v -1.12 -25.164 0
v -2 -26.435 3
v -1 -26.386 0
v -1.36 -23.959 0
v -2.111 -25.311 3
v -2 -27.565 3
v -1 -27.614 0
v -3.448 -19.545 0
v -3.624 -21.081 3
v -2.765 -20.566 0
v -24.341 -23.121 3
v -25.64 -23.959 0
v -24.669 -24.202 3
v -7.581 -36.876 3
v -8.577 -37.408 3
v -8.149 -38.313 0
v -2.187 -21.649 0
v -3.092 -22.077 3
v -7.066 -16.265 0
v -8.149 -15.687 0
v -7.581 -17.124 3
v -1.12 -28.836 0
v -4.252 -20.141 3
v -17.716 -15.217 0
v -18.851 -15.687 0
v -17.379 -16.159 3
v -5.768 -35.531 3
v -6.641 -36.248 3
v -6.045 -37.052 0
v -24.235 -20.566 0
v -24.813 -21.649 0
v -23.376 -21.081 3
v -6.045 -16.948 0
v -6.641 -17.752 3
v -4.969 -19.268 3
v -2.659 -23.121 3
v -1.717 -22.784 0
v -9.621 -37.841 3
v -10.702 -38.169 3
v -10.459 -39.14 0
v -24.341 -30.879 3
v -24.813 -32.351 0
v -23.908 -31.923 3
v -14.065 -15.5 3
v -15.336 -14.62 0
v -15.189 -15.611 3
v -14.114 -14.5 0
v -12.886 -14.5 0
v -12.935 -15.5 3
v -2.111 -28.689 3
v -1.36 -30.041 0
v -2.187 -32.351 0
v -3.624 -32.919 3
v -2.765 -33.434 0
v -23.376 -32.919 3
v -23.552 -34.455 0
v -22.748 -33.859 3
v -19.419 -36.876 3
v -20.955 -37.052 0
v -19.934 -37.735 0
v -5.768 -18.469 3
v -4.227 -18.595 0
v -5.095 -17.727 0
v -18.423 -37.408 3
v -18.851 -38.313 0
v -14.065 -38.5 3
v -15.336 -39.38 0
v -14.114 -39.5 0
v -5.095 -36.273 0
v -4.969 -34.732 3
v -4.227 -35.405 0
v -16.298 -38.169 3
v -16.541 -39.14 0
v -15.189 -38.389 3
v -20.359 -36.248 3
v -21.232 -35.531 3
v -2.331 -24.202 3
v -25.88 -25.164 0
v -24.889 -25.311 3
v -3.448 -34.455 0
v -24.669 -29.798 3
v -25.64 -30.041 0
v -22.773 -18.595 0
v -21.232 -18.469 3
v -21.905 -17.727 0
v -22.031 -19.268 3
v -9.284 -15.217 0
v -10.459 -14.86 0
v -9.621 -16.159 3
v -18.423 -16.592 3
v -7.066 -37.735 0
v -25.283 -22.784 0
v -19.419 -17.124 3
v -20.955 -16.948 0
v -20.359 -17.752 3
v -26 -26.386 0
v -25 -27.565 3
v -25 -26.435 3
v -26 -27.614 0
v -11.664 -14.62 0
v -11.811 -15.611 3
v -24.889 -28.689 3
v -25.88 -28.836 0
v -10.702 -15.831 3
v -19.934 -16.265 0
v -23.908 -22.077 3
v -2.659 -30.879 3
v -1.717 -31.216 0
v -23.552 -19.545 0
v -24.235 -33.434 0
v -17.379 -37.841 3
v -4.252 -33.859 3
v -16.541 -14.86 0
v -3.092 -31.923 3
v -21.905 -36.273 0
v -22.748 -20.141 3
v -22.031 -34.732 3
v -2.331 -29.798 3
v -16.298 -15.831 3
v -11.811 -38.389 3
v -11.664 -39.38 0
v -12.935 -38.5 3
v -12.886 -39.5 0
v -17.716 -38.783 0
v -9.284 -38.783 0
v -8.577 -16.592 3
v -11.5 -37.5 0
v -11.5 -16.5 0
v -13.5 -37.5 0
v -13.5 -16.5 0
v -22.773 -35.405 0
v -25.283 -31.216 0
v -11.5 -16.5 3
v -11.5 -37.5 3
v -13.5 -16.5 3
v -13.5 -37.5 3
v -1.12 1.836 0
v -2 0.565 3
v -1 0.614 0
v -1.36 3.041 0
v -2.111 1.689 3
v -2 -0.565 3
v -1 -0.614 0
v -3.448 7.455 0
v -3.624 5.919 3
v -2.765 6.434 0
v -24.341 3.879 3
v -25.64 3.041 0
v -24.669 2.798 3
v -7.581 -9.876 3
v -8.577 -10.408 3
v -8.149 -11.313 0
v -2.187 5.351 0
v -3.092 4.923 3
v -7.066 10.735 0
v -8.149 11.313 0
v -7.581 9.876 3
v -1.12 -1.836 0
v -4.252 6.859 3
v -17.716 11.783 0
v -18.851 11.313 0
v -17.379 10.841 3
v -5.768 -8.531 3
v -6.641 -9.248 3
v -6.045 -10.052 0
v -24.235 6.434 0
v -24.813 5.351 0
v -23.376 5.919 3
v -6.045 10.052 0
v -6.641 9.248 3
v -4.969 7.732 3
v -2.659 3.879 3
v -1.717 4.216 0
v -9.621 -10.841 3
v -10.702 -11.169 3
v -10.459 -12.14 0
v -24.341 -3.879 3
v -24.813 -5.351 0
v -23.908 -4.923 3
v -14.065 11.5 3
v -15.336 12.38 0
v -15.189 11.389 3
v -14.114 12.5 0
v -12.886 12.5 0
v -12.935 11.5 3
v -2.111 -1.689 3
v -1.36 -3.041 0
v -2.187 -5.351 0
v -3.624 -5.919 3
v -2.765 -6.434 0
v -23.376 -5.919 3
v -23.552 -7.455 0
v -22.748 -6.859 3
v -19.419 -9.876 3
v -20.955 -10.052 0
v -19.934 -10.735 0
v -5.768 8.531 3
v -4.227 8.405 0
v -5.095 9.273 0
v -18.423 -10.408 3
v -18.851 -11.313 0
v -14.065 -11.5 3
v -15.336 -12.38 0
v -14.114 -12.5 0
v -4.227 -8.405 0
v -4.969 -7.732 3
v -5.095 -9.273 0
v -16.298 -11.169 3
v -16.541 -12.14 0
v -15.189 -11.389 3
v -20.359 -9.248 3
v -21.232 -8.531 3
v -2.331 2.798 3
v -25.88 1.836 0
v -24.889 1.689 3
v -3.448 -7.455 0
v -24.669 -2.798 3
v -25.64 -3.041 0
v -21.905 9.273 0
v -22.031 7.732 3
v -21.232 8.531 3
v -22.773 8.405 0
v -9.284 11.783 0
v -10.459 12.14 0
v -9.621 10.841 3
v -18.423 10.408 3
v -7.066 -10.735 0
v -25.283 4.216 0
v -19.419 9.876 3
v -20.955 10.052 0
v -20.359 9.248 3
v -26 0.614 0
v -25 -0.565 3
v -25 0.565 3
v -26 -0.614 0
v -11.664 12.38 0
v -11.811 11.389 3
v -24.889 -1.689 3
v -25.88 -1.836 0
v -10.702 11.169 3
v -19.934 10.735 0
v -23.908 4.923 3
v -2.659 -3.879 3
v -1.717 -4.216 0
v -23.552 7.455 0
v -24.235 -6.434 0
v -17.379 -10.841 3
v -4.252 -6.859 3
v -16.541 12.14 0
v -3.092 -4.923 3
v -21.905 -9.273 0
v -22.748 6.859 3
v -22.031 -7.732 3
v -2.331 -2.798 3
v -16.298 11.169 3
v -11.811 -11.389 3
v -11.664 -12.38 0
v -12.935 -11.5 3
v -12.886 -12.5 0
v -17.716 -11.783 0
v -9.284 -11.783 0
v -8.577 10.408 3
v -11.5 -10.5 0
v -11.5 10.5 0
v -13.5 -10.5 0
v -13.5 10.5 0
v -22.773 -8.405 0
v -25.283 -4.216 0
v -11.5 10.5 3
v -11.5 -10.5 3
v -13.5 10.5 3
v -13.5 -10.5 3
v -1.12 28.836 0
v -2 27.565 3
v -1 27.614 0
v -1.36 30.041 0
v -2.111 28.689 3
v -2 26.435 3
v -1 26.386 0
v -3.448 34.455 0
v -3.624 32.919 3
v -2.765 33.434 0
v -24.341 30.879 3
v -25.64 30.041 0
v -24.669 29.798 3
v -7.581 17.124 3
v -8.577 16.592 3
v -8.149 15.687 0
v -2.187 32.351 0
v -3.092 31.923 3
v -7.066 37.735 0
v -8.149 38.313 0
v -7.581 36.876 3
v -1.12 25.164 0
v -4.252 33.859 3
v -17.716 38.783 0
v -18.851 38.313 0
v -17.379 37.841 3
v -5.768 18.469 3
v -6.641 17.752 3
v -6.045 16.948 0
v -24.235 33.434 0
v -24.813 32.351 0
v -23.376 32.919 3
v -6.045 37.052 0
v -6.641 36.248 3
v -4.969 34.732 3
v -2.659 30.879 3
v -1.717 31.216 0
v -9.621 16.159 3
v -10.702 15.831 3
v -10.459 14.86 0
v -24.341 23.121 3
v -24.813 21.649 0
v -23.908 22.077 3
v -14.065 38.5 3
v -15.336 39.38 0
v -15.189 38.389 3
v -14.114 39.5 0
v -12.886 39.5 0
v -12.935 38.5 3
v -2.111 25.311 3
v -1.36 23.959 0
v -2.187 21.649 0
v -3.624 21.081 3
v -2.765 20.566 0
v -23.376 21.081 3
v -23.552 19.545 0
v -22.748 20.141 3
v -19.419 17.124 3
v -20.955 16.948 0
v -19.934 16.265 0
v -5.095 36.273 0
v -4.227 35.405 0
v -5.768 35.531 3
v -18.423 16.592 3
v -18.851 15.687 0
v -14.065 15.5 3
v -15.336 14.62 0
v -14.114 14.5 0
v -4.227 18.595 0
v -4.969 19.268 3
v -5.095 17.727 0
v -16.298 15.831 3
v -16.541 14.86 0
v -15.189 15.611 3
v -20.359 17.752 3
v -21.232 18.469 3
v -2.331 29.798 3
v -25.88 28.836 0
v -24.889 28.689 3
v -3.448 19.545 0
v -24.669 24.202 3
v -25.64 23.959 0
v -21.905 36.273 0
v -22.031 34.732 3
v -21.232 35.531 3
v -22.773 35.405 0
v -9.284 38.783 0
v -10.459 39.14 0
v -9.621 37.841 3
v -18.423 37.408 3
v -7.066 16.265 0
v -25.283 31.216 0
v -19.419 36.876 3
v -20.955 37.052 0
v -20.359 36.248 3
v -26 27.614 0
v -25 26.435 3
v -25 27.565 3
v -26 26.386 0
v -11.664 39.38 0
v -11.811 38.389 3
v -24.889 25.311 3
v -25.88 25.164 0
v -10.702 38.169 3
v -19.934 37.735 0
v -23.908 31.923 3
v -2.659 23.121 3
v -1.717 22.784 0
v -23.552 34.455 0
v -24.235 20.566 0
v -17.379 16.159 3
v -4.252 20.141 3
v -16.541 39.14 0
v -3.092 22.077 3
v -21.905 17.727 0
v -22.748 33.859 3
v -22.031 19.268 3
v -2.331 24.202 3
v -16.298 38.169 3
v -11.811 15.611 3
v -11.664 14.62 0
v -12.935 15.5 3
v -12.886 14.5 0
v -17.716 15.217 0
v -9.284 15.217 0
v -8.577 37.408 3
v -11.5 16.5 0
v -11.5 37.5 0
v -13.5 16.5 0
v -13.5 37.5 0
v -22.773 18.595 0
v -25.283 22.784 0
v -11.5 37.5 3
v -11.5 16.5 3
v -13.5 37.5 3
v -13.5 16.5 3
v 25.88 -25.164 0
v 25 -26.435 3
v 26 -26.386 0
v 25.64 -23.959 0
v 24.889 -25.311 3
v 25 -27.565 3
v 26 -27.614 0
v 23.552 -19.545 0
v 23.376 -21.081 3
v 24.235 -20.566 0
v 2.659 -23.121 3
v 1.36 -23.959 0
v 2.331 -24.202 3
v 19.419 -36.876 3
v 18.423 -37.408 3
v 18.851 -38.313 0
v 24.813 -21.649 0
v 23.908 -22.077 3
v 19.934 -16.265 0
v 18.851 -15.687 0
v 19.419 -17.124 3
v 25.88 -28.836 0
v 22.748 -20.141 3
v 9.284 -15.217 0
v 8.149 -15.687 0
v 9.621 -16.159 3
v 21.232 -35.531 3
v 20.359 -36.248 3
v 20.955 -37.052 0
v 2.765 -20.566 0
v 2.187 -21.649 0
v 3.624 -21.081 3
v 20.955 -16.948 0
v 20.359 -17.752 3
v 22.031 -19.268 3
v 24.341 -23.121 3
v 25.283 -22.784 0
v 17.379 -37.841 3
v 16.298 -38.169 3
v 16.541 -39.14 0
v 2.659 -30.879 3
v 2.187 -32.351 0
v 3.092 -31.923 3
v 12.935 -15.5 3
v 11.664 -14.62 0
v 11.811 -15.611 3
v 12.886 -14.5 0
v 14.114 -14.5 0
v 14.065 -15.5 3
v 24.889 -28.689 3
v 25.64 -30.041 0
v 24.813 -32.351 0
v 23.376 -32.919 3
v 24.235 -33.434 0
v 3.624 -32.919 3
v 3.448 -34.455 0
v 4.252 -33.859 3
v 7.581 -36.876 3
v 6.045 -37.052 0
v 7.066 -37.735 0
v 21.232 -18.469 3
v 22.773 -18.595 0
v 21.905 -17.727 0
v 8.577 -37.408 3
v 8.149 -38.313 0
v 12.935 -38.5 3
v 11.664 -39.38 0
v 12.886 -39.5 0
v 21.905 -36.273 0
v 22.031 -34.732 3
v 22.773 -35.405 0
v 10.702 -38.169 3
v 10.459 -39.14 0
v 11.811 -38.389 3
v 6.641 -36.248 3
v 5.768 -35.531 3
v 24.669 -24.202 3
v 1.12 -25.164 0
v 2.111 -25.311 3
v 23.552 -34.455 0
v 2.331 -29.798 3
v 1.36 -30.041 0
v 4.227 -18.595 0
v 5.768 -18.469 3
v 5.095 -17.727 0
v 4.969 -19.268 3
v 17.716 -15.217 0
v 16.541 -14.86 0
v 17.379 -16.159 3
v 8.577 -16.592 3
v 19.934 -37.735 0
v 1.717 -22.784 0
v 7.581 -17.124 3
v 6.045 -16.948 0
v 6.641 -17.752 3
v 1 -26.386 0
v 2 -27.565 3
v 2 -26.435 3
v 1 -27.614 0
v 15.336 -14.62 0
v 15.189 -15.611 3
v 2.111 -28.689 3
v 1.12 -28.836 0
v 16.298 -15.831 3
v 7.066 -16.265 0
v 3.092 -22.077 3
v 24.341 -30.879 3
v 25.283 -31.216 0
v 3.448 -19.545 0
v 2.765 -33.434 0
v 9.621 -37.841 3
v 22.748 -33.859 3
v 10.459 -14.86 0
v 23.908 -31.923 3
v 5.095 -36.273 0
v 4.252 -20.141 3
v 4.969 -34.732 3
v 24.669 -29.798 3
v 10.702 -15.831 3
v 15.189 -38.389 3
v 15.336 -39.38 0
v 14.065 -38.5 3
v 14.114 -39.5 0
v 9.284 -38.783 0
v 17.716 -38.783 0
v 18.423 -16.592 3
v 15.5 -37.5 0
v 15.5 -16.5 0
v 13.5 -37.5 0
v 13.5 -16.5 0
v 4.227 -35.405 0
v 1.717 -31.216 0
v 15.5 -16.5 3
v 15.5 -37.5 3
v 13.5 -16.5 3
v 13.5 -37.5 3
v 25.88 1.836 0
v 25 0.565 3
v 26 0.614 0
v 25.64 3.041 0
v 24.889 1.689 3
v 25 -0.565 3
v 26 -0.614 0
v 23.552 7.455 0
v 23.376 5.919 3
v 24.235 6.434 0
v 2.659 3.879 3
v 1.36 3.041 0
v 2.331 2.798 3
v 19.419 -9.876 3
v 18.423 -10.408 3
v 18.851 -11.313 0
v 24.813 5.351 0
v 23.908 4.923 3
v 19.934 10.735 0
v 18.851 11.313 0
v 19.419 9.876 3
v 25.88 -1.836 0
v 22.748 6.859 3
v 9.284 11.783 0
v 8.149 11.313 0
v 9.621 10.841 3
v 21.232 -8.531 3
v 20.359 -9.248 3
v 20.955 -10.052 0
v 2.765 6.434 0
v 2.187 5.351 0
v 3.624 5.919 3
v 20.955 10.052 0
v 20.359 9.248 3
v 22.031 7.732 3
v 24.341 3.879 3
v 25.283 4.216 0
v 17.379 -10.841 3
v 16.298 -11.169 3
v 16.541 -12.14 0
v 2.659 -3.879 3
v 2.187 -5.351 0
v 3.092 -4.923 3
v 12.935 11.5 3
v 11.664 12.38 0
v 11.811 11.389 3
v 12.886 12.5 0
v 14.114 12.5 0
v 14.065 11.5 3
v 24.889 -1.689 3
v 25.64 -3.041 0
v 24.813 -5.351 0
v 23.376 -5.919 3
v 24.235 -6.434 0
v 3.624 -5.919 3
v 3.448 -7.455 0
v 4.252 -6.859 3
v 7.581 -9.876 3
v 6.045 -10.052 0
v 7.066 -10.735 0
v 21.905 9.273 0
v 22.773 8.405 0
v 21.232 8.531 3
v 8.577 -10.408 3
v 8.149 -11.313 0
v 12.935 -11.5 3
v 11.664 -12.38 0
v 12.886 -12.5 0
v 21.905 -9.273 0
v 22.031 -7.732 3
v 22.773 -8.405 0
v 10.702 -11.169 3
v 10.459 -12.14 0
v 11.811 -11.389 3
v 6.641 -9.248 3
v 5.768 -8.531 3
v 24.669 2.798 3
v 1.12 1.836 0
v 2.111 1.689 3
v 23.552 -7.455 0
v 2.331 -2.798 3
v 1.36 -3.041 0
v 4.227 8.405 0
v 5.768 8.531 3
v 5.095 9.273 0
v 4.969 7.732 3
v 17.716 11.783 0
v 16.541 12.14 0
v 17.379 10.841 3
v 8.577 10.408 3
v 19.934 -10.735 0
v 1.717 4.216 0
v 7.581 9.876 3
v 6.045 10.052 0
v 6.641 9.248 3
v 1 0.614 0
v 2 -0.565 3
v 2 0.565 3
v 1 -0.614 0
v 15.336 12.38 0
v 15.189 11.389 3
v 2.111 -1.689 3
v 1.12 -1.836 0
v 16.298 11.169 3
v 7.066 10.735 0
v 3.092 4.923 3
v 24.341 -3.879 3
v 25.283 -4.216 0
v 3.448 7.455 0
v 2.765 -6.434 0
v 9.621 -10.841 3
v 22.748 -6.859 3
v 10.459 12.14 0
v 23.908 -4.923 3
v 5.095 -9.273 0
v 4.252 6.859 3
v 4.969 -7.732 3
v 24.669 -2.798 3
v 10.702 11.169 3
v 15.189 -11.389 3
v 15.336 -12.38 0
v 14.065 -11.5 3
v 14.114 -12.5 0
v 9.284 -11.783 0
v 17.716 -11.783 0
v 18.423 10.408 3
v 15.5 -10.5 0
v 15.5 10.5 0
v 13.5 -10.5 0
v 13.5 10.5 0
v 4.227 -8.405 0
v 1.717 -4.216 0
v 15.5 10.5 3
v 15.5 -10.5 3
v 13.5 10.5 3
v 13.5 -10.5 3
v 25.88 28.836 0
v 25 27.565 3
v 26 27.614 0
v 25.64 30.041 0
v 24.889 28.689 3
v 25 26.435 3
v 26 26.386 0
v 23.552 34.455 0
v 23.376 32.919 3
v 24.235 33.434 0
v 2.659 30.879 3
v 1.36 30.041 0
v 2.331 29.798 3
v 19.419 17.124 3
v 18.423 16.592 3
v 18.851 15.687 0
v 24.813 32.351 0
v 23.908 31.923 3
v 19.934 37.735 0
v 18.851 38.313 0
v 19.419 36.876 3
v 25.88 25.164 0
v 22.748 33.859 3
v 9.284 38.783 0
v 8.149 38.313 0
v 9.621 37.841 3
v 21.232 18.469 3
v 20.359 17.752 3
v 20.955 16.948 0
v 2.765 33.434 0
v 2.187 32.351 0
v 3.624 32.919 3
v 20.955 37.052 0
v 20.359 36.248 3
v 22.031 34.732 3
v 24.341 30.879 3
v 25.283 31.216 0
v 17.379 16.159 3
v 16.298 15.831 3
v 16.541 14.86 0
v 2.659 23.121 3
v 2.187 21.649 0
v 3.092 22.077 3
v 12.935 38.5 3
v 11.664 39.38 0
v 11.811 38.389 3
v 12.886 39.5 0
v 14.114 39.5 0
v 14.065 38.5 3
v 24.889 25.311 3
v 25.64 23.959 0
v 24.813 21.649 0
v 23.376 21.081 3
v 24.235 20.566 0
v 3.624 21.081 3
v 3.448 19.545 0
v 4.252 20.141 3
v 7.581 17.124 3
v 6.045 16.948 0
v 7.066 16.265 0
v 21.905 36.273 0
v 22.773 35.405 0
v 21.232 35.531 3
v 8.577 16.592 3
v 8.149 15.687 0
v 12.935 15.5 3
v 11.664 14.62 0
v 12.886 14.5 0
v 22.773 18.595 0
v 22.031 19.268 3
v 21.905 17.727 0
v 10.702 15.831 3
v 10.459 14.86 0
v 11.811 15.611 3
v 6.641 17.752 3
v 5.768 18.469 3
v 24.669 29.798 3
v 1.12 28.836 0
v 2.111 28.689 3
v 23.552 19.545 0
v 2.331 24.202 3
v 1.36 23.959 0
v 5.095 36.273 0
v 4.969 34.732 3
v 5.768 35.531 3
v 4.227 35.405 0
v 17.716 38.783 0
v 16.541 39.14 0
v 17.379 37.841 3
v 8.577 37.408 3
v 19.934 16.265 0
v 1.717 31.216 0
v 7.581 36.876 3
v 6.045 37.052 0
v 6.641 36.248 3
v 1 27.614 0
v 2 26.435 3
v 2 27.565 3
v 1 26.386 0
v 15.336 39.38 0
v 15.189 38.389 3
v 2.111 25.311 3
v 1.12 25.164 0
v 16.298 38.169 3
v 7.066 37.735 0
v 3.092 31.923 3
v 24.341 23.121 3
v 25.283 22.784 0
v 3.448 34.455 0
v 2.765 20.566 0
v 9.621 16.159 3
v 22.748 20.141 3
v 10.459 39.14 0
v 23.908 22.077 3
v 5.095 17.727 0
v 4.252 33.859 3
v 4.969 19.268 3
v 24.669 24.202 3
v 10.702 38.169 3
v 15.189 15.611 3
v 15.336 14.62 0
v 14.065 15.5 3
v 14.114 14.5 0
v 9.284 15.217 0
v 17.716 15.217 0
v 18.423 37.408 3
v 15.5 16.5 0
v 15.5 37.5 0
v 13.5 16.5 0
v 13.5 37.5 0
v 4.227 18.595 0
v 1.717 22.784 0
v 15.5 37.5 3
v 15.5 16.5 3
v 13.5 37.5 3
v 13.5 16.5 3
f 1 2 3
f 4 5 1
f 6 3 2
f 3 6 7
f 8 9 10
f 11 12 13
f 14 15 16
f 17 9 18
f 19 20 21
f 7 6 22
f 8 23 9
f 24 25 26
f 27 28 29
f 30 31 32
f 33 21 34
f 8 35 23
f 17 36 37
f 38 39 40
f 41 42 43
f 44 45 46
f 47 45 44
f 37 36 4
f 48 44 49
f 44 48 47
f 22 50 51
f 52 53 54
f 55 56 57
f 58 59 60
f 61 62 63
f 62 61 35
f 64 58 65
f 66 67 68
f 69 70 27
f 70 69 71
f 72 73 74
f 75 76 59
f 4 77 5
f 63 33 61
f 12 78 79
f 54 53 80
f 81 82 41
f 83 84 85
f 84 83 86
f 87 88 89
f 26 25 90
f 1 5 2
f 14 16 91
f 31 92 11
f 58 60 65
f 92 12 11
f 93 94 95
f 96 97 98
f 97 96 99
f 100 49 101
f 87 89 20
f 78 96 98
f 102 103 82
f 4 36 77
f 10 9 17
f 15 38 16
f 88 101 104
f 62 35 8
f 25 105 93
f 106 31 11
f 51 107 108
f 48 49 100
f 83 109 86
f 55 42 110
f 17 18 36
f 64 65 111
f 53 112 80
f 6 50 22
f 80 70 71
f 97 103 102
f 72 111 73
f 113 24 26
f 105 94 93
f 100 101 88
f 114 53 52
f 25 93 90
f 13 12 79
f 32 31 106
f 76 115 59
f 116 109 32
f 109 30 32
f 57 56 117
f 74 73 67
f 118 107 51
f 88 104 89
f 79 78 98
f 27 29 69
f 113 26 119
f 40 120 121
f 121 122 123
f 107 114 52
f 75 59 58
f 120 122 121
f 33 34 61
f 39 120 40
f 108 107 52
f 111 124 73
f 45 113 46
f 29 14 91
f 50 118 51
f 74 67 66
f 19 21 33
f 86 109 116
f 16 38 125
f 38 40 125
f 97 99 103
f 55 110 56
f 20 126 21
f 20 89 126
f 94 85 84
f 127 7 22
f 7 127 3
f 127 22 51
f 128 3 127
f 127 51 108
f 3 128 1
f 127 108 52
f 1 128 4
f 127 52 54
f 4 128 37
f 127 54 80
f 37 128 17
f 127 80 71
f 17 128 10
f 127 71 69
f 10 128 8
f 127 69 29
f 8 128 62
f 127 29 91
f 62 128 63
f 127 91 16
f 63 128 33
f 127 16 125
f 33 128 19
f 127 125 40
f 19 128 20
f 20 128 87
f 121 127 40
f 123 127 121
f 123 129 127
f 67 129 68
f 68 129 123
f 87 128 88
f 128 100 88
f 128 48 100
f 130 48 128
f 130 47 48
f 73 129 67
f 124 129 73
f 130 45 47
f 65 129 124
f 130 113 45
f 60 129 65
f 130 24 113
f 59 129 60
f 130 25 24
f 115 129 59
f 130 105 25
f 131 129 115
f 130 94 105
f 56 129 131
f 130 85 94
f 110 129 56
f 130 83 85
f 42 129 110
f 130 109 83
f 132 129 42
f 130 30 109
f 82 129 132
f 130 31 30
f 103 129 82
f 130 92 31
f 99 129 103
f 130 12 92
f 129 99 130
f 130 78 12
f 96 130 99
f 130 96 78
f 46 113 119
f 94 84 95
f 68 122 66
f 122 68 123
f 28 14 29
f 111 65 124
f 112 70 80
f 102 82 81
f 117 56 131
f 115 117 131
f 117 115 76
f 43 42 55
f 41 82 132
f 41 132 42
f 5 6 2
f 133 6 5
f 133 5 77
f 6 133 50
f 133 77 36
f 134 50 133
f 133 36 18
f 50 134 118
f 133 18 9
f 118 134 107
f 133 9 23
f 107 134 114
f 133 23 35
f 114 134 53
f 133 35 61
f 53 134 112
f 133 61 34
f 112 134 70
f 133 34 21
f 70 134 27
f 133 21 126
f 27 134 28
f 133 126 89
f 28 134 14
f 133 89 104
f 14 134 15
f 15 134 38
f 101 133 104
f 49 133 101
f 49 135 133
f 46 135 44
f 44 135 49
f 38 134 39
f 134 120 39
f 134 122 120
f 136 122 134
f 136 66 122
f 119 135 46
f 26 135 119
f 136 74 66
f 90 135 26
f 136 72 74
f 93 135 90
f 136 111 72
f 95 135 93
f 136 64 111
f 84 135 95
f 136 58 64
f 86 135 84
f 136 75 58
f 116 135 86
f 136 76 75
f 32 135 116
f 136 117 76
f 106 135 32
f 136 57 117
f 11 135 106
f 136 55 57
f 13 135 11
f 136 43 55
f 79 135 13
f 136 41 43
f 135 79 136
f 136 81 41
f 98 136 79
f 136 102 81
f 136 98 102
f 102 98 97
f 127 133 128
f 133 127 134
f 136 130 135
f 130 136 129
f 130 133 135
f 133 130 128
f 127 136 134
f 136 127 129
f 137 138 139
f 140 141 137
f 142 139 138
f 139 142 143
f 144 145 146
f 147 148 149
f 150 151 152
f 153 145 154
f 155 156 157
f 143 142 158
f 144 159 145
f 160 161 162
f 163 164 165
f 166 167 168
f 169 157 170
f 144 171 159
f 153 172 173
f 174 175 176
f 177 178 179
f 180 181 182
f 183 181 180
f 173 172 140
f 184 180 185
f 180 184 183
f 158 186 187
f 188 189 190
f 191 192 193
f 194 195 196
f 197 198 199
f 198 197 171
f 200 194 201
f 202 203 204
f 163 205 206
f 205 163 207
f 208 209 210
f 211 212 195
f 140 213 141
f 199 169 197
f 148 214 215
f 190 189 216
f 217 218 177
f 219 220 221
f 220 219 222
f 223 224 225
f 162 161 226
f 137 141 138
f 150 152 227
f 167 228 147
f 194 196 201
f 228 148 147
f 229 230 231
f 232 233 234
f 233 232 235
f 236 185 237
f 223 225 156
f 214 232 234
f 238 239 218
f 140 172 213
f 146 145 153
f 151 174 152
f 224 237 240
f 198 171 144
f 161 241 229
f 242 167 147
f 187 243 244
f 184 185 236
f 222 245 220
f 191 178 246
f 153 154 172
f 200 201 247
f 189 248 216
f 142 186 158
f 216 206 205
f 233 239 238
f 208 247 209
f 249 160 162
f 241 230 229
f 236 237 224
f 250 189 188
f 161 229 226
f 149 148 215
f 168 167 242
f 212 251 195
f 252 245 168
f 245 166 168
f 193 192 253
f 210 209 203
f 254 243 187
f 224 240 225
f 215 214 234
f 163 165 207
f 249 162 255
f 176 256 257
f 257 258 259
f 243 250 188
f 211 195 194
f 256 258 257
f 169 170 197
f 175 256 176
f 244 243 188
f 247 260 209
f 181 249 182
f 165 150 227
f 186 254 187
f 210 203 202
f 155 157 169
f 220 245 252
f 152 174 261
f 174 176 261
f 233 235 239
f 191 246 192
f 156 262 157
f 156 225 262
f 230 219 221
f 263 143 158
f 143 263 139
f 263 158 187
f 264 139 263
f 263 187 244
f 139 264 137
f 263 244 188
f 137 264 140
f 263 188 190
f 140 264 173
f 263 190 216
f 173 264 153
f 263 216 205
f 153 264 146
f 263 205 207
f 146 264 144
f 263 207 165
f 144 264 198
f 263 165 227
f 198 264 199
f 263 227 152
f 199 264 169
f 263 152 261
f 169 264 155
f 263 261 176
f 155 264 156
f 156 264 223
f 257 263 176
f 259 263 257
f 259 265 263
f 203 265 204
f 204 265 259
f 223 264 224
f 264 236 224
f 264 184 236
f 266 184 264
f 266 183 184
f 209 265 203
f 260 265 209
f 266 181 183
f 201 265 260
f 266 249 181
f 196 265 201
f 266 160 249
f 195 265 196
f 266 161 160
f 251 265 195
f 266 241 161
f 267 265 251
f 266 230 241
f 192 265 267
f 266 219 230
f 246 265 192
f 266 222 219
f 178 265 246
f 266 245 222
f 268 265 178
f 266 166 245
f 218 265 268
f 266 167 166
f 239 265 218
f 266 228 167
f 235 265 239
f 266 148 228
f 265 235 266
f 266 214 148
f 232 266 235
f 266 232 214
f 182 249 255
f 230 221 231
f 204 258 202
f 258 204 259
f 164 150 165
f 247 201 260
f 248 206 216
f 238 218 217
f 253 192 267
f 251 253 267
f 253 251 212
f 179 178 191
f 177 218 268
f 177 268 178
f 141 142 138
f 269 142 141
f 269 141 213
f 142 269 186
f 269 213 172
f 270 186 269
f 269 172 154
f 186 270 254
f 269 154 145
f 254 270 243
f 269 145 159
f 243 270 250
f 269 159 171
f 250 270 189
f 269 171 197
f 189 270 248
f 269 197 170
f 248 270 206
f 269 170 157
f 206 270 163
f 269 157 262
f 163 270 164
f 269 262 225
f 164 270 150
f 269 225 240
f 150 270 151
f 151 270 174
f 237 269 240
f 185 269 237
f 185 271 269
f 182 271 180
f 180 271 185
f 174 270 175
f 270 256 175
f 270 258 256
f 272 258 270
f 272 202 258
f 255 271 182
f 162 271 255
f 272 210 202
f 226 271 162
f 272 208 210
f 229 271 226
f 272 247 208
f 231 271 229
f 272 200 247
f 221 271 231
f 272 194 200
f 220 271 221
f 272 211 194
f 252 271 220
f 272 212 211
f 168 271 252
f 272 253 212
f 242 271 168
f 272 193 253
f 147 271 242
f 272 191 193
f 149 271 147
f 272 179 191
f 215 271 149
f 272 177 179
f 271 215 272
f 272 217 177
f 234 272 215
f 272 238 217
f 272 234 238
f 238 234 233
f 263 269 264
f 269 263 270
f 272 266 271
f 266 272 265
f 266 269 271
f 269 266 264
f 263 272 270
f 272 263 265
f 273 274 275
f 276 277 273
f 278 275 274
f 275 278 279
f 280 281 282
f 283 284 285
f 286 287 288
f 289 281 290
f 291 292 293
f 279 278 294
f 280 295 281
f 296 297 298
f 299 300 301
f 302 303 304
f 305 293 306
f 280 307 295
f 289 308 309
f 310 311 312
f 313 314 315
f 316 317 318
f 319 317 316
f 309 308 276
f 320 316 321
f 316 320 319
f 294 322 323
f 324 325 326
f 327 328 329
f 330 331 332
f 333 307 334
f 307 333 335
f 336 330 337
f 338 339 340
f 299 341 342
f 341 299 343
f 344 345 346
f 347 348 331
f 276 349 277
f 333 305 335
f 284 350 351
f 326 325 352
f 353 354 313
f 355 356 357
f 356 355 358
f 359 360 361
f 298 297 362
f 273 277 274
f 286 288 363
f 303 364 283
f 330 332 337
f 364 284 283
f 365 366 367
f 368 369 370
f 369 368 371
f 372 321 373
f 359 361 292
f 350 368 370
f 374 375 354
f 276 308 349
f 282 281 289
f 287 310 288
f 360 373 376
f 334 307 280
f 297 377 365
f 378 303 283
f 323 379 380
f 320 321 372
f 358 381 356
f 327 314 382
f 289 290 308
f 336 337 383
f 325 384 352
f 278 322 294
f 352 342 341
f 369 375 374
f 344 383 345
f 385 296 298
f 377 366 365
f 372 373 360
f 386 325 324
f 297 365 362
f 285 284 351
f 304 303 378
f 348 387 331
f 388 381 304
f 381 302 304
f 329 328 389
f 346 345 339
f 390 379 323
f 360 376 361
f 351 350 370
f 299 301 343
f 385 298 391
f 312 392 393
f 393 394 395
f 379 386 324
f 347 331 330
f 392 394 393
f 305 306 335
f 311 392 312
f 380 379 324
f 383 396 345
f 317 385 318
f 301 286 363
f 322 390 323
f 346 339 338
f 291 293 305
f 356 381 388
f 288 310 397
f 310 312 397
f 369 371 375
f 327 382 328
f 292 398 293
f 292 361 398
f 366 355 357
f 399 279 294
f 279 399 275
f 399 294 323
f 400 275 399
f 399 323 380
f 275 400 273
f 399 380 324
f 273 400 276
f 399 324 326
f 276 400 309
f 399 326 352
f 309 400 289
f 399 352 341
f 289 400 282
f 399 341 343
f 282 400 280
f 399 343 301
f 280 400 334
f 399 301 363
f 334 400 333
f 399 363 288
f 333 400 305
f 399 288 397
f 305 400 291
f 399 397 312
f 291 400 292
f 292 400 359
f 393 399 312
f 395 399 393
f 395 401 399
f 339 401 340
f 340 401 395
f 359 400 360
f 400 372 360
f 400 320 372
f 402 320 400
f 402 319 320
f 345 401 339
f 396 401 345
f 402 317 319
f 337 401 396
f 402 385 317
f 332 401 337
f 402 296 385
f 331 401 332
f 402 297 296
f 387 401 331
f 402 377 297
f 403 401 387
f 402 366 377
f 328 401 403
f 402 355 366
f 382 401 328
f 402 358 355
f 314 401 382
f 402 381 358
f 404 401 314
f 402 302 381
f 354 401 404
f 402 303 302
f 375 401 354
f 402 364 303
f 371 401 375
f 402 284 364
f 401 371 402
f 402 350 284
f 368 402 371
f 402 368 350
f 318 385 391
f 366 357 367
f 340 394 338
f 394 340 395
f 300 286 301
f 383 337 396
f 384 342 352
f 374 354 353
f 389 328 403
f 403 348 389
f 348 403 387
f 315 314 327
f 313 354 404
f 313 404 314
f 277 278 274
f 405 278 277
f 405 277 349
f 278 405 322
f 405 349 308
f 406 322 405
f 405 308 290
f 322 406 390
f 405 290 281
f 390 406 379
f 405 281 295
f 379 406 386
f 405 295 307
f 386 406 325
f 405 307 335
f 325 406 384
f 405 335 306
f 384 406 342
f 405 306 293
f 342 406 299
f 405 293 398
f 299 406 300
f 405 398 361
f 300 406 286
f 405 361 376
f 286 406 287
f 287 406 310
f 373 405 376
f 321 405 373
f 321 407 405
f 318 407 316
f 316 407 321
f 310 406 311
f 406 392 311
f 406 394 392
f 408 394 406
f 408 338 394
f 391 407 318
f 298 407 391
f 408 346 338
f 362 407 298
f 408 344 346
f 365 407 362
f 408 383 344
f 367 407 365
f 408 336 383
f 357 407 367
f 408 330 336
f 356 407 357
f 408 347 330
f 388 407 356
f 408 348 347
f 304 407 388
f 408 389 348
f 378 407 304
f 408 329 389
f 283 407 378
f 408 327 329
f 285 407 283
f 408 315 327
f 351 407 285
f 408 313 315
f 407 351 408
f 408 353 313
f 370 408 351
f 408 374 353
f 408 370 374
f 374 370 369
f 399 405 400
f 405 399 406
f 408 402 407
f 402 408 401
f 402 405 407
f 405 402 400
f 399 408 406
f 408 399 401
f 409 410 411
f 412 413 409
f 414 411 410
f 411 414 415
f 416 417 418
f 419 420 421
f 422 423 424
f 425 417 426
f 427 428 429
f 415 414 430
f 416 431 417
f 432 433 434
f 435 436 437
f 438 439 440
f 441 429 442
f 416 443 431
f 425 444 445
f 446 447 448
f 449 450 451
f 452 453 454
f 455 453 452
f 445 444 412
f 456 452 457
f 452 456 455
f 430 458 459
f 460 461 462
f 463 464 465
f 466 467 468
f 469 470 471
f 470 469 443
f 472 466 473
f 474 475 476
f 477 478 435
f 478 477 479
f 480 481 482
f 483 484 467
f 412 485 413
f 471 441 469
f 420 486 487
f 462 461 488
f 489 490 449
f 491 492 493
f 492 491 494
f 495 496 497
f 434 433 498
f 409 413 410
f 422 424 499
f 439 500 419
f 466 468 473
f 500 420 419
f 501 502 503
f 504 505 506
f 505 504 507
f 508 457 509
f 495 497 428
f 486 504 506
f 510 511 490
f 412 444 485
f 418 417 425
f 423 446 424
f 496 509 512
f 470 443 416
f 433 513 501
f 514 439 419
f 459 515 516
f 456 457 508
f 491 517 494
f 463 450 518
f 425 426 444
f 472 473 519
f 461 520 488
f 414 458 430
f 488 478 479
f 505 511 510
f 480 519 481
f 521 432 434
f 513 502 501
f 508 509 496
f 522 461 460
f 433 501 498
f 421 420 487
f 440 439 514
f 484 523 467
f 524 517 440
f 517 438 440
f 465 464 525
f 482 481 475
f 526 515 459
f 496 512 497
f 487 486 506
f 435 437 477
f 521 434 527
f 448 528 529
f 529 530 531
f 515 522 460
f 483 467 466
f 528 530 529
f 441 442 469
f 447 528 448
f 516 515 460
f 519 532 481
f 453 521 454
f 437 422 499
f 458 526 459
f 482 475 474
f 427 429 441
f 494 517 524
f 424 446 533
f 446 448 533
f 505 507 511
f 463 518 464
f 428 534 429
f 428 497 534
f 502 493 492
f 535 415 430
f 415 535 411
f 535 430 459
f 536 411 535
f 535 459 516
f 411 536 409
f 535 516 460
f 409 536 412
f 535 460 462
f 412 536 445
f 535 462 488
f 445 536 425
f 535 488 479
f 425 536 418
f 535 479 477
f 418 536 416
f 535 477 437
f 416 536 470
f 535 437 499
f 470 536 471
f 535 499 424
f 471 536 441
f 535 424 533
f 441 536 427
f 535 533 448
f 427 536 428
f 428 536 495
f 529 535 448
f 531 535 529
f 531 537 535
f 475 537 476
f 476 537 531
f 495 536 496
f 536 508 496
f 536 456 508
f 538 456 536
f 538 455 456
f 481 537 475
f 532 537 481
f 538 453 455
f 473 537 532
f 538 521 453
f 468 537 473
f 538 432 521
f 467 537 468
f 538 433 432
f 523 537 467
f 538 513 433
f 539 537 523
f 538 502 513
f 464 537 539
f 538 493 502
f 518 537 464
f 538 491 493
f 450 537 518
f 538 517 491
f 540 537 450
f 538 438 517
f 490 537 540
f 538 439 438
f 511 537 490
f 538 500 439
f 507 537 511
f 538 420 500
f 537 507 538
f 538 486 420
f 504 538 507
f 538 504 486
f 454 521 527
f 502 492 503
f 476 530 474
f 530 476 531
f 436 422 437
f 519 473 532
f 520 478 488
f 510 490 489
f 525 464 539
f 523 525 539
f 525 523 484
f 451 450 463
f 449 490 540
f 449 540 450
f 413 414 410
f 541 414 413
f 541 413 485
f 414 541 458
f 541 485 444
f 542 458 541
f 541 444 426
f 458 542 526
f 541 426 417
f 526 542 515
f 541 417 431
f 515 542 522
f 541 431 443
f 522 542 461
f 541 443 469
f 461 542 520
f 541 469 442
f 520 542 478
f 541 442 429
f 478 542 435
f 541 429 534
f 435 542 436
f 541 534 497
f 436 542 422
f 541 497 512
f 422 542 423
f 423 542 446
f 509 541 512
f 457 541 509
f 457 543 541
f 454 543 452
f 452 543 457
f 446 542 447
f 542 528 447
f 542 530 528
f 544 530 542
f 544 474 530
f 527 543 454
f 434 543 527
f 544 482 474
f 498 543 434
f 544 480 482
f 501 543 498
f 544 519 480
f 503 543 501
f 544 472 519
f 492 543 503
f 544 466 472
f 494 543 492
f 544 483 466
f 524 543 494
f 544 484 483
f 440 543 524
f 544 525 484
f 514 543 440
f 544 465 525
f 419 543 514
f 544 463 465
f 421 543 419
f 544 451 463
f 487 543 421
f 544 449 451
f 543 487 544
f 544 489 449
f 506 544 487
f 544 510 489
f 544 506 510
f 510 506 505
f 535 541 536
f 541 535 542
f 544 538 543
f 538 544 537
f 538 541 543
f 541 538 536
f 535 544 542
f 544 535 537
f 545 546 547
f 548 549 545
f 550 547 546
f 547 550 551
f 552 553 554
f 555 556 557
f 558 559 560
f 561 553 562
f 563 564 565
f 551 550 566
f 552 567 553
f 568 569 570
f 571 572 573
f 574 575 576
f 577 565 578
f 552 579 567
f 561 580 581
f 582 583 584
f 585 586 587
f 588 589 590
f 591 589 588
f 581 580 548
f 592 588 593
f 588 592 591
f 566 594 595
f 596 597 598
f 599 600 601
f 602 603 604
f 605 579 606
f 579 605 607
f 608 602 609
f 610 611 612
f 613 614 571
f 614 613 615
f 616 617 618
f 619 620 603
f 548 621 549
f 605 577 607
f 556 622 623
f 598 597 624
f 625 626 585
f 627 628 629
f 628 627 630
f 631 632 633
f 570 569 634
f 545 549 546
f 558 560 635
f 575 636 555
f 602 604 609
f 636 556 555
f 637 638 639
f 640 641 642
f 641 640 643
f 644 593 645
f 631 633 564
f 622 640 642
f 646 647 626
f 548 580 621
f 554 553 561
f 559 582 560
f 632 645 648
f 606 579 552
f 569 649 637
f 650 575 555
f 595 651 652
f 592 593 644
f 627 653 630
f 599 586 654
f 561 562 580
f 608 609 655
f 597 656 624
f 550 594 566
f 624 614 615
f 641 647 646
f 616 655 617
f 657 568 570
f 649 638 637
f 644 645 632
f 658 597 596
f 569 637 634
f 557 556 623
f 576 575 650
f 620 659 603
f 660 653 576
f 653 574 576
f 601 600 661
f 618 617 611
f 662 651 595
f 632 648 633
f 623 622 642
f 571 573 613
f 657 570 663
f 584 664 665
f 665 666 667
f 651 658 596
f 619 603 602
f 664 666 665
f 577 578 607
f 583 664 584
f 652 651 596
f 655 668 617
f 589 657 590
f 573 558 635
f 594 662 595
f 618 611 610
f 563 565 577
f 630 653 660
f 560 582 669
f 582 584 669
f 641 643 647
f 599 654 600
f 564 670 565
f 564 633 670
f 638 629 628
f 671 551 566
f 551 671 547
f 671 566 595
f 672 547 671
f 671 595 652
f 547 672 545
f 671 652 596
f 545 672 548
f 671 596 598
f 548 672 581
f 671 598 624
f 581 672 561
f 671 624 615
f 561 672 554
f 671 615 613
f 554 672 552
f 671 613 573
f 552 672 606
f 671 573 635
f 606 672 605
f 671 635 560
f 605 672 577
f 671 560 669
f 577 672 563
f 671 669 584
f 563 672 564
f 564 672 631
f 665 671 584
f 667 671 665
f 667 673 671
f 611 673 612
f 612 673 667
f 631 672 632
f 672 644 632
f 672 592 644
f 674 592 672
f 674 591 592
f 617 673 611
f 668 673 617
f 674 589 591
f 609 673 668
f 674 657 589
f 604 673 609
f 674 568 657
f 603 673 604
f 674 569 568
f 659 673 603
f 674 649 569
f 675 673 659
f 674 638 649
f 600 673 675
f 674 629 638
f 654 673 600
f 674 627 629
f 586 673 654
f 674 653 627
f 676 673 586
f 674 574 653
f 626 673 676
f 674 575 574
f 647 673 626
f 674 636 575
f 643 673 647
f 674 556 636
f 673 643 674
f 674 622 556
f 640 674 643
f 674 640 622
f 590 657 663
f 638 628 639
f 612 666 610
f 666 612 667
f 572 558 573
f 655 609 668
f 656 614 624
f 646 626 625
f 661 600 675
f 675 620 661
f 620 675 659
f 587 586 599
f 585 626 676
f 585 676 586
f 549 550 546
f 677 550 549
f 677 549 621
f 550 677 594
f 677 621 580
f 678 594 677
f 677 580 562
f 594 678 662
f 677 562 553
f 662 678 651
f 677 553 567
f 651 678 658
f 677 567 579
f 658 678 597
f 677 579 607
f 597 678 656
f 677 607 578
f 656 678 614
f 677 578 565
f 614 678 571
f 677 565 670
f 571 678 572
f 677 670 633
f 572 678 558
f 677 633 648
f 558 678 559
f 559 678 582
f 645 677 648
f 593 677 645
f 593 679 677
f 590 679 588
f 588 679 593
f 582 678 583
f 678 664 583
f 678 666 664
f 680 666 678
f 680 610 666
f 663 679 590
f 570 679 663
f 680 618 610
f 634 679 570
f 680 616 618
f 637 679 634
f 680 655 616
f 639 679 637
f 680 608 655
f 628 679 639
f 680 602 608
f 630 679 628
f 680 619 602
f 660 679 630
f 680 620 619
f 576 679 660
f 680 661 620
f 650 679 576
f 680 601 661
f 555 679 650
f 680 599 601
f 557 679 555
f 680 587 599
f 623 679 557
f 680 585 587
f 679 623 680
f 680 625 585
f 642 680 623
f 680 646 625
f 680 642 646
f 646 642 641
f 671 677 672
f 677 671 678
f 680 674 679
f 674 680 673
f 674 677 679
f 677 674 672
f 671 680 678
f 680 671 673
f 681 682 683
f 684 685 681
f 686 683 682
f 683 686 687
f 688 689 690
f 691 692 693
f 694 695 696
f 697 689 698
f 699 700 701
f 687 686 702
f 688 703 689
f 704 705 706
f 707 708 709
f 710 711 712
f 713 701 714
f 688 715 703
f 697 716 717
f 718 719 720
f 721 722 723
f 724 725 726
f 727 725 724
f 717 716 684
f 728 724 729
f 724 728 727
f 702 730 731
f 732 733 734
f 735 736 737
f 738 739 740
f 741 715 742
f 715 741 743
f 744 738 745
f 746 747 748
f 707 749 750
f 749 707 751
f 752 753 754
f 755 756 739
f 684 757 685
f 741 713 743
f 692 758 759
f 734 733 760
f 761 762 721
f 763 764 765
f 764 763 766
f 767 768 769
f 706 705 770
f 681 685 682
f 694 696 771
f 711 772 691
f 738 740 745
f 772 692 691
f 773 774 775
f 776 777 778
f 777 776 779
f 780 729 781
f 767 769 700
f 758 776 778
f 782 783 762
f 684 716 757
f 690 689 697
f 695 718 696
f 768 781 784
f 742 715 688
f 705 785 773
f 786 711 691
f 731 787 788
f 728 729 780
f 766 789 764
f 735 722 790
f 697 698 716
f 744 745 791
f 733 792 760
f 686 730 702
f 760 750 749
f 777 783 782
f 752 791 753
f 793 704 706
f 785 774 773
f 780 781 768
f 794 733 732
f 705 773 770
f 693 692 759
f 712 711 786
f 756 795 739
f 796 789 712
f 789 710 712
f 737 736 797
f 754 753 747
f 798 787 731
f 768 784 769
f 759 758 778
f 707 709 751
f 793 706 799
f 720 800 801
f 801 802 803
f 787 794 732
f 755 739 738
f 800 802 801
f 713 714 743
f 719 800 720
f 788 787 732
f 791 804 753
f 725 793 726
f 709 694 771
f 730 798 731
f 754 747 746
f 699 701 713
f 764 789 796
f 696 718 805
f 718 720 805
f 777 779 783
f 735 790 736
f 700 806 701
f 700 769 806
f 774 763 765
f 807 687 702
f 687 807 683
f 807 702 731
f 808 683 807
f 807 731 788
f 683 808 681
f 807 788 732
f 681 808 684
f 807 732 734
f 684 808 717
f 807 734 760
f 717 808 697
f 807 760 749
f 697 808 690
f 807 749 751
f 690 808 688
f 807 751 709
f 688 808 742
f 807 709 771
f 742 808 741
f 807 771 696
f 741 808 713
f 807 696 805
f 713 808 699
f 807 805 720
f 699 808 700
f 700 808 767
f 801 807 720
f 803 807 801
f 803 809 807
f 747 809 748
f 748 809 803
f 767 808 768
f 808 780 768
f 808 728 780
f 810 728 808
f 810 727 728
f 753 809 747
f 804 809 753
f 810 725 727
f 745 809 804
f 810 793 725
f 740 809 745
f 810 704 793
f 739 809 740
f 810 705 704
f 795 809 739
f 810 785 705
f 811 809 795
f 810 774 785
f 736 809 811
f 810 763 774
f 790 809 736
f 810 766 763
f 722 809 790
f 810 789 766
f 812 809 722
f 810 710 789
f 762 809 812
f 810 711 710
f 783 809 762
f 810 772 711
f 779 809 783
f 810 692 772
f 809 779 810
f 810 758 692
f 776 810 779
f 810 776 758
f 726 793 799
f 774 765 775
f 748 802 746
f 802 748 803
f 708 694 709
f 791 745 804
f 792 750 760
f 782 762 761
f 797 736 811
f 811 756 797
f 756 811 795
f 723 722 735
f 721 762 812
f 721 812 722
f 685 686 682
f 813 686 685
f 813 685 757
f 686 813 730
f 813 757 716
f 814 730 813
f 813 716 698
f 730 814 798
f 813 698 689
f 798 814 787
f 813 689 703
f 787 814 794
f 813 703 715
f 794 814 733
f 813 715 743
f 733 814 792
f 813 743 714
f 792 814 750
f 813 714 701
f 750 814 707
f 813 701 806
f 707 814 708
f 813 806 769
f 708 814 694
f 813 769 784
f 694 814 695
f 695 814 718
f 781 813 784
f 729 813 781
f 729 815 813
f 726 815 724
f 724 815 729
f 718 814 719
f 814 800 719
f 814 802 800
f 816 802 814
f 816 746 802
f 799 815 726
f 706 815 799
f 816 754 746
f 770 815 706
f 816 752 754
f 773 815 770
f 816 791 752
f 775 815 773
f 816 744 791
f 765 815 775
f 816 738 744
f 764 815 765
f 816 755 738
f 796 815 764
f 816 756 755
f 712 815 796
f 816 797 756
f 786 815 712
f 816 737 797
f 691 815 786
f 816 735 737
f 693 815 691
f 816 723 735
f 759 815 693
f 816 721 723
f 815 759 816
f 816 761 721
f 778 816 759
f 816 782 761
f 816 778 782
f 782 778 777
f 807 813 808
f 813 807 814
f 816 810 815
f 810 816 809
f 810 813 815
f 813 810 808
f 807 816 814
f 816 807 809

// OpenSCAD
// base v1_1
// GPLv2
// (c) 2012 TakeItAndRun
//
// v1_0: clean up code
// v1_1: make it work with customizer
// 
//

//*******************************************************
//
// basic definitions
//
//*******************************************************


// circle have $fn facets
$fn=+30;

// small displacement to avoid parallel faces with zero volume
e=+0.02;

// unit vectors
xaxis=[1,0,0];
yaxis=[0,1,0];
zaxis=[0,0,1];

//*******************************************************
//
// dimensions
//
//*******************************************************

/* [base] */
// form of base
rbfn=64;//[4:square,8:octagonal,64:round]
// diameter of the base (for square bases this is the width)
db=25;//[10:100]
// hexagonal and oktogonal a little less in width)
rb=db/2;
// width of the edge (in 1/10 units)
e=10;//[0:20]
edge=e/10;
// to calculate upper radius of the base
rb1=rb-edge;
// height of the base
hb=3;//[1:10]
/* [slit] */
// slit
slit=1;//[0:no slit,1:with slit]
// width of the slit
sx=2;//[1:10]
// offset of the slit off the center
dsx=1;//[0:10]
// length of the slit
sl=2*rb-2*edge-2;
/* [print] */
// distance between bases on the print bed
dxprint=2;//[1:10]
// number of bases in x-direction
nx=2;//[1:10]
// number of bases in y-direction
ny=3;//[1:10]

//*******************************************************
//
// routines
//
//*******************************************************

// base with n corners, set n=rbnf for a round base
module base(n,slit=1){
	difference(){
		rotate(180/n)cylinder(hb,rb/cos(180/n),rb1/cos(180/n),$fn=n);
		if(slit==1)mslit();
	}
}

// make a cubus for the slit to be cut from the base
module mslit(){
	translate(dsx*xaxis+(hb)/2*zaxis)cube([sx,sl,hb+2*e],true);
}

module printbase(n=4,slit=1,nx=5,ny=5){
	for(i=[-(nx-1)/2:(nx-1)/2])
	for(j=[-(ny-1)/2:(ny-1)/2])
		translate((dxprint+2*rb)*(i*xaxis+j*yaxis))base(n,slit);
}

// print a sampling of bases
module samplebase(){
	translate(0*(dxprint+2*rb)*yaxis)base(n=4,slit=1);
	translate(3*(dxprint+2*rb)*yaxis)rotate(30)base(n=6,slit=1);
	translate(2*(dxprint+2*rb)*yaxis)base(n=8,slit=1);
	translate(1*(dxprint+2*rb)*yaxis)base(n=rbfn,slit=1);
	translate(4*(dxprint+2*rb)*yaxis)difference(){
		rotate(30)base(n=6,slit=0);
		mslit();
	}
	
	translate(1*(dxprint+2*rb)*xaxis){
	translate(0*(dxprint+2*rb)*yaxis)base(n=4,slit=0);
	translate((3*(dxprint+2*rb)+rb)*yaxis)rotate(30)base(n=6,slit=0);
	translate(2*(dxprint+2*rb)*yaxis)base(n=8,slit=0);
	translate(1*(dxprint+2*rb)*yaxis)base(n=rbfn,slit=0);
	}
}


//*******************************************************
//
// main program
//
//*******************************************************

// one single base
// n=4 		makes it square, with r being half the diameter
// n=8 		oktogonal(sp?)
// n=rbfn 	round

//base(n=4,slit=0);

// print a sampling of bases
// color("lime")samplebase();

// print lots of bases all at once
//printbase(n=rbfn,slit=1);
printbase(n=rbfn,slit=slit,nx=nx,ny=ny);
